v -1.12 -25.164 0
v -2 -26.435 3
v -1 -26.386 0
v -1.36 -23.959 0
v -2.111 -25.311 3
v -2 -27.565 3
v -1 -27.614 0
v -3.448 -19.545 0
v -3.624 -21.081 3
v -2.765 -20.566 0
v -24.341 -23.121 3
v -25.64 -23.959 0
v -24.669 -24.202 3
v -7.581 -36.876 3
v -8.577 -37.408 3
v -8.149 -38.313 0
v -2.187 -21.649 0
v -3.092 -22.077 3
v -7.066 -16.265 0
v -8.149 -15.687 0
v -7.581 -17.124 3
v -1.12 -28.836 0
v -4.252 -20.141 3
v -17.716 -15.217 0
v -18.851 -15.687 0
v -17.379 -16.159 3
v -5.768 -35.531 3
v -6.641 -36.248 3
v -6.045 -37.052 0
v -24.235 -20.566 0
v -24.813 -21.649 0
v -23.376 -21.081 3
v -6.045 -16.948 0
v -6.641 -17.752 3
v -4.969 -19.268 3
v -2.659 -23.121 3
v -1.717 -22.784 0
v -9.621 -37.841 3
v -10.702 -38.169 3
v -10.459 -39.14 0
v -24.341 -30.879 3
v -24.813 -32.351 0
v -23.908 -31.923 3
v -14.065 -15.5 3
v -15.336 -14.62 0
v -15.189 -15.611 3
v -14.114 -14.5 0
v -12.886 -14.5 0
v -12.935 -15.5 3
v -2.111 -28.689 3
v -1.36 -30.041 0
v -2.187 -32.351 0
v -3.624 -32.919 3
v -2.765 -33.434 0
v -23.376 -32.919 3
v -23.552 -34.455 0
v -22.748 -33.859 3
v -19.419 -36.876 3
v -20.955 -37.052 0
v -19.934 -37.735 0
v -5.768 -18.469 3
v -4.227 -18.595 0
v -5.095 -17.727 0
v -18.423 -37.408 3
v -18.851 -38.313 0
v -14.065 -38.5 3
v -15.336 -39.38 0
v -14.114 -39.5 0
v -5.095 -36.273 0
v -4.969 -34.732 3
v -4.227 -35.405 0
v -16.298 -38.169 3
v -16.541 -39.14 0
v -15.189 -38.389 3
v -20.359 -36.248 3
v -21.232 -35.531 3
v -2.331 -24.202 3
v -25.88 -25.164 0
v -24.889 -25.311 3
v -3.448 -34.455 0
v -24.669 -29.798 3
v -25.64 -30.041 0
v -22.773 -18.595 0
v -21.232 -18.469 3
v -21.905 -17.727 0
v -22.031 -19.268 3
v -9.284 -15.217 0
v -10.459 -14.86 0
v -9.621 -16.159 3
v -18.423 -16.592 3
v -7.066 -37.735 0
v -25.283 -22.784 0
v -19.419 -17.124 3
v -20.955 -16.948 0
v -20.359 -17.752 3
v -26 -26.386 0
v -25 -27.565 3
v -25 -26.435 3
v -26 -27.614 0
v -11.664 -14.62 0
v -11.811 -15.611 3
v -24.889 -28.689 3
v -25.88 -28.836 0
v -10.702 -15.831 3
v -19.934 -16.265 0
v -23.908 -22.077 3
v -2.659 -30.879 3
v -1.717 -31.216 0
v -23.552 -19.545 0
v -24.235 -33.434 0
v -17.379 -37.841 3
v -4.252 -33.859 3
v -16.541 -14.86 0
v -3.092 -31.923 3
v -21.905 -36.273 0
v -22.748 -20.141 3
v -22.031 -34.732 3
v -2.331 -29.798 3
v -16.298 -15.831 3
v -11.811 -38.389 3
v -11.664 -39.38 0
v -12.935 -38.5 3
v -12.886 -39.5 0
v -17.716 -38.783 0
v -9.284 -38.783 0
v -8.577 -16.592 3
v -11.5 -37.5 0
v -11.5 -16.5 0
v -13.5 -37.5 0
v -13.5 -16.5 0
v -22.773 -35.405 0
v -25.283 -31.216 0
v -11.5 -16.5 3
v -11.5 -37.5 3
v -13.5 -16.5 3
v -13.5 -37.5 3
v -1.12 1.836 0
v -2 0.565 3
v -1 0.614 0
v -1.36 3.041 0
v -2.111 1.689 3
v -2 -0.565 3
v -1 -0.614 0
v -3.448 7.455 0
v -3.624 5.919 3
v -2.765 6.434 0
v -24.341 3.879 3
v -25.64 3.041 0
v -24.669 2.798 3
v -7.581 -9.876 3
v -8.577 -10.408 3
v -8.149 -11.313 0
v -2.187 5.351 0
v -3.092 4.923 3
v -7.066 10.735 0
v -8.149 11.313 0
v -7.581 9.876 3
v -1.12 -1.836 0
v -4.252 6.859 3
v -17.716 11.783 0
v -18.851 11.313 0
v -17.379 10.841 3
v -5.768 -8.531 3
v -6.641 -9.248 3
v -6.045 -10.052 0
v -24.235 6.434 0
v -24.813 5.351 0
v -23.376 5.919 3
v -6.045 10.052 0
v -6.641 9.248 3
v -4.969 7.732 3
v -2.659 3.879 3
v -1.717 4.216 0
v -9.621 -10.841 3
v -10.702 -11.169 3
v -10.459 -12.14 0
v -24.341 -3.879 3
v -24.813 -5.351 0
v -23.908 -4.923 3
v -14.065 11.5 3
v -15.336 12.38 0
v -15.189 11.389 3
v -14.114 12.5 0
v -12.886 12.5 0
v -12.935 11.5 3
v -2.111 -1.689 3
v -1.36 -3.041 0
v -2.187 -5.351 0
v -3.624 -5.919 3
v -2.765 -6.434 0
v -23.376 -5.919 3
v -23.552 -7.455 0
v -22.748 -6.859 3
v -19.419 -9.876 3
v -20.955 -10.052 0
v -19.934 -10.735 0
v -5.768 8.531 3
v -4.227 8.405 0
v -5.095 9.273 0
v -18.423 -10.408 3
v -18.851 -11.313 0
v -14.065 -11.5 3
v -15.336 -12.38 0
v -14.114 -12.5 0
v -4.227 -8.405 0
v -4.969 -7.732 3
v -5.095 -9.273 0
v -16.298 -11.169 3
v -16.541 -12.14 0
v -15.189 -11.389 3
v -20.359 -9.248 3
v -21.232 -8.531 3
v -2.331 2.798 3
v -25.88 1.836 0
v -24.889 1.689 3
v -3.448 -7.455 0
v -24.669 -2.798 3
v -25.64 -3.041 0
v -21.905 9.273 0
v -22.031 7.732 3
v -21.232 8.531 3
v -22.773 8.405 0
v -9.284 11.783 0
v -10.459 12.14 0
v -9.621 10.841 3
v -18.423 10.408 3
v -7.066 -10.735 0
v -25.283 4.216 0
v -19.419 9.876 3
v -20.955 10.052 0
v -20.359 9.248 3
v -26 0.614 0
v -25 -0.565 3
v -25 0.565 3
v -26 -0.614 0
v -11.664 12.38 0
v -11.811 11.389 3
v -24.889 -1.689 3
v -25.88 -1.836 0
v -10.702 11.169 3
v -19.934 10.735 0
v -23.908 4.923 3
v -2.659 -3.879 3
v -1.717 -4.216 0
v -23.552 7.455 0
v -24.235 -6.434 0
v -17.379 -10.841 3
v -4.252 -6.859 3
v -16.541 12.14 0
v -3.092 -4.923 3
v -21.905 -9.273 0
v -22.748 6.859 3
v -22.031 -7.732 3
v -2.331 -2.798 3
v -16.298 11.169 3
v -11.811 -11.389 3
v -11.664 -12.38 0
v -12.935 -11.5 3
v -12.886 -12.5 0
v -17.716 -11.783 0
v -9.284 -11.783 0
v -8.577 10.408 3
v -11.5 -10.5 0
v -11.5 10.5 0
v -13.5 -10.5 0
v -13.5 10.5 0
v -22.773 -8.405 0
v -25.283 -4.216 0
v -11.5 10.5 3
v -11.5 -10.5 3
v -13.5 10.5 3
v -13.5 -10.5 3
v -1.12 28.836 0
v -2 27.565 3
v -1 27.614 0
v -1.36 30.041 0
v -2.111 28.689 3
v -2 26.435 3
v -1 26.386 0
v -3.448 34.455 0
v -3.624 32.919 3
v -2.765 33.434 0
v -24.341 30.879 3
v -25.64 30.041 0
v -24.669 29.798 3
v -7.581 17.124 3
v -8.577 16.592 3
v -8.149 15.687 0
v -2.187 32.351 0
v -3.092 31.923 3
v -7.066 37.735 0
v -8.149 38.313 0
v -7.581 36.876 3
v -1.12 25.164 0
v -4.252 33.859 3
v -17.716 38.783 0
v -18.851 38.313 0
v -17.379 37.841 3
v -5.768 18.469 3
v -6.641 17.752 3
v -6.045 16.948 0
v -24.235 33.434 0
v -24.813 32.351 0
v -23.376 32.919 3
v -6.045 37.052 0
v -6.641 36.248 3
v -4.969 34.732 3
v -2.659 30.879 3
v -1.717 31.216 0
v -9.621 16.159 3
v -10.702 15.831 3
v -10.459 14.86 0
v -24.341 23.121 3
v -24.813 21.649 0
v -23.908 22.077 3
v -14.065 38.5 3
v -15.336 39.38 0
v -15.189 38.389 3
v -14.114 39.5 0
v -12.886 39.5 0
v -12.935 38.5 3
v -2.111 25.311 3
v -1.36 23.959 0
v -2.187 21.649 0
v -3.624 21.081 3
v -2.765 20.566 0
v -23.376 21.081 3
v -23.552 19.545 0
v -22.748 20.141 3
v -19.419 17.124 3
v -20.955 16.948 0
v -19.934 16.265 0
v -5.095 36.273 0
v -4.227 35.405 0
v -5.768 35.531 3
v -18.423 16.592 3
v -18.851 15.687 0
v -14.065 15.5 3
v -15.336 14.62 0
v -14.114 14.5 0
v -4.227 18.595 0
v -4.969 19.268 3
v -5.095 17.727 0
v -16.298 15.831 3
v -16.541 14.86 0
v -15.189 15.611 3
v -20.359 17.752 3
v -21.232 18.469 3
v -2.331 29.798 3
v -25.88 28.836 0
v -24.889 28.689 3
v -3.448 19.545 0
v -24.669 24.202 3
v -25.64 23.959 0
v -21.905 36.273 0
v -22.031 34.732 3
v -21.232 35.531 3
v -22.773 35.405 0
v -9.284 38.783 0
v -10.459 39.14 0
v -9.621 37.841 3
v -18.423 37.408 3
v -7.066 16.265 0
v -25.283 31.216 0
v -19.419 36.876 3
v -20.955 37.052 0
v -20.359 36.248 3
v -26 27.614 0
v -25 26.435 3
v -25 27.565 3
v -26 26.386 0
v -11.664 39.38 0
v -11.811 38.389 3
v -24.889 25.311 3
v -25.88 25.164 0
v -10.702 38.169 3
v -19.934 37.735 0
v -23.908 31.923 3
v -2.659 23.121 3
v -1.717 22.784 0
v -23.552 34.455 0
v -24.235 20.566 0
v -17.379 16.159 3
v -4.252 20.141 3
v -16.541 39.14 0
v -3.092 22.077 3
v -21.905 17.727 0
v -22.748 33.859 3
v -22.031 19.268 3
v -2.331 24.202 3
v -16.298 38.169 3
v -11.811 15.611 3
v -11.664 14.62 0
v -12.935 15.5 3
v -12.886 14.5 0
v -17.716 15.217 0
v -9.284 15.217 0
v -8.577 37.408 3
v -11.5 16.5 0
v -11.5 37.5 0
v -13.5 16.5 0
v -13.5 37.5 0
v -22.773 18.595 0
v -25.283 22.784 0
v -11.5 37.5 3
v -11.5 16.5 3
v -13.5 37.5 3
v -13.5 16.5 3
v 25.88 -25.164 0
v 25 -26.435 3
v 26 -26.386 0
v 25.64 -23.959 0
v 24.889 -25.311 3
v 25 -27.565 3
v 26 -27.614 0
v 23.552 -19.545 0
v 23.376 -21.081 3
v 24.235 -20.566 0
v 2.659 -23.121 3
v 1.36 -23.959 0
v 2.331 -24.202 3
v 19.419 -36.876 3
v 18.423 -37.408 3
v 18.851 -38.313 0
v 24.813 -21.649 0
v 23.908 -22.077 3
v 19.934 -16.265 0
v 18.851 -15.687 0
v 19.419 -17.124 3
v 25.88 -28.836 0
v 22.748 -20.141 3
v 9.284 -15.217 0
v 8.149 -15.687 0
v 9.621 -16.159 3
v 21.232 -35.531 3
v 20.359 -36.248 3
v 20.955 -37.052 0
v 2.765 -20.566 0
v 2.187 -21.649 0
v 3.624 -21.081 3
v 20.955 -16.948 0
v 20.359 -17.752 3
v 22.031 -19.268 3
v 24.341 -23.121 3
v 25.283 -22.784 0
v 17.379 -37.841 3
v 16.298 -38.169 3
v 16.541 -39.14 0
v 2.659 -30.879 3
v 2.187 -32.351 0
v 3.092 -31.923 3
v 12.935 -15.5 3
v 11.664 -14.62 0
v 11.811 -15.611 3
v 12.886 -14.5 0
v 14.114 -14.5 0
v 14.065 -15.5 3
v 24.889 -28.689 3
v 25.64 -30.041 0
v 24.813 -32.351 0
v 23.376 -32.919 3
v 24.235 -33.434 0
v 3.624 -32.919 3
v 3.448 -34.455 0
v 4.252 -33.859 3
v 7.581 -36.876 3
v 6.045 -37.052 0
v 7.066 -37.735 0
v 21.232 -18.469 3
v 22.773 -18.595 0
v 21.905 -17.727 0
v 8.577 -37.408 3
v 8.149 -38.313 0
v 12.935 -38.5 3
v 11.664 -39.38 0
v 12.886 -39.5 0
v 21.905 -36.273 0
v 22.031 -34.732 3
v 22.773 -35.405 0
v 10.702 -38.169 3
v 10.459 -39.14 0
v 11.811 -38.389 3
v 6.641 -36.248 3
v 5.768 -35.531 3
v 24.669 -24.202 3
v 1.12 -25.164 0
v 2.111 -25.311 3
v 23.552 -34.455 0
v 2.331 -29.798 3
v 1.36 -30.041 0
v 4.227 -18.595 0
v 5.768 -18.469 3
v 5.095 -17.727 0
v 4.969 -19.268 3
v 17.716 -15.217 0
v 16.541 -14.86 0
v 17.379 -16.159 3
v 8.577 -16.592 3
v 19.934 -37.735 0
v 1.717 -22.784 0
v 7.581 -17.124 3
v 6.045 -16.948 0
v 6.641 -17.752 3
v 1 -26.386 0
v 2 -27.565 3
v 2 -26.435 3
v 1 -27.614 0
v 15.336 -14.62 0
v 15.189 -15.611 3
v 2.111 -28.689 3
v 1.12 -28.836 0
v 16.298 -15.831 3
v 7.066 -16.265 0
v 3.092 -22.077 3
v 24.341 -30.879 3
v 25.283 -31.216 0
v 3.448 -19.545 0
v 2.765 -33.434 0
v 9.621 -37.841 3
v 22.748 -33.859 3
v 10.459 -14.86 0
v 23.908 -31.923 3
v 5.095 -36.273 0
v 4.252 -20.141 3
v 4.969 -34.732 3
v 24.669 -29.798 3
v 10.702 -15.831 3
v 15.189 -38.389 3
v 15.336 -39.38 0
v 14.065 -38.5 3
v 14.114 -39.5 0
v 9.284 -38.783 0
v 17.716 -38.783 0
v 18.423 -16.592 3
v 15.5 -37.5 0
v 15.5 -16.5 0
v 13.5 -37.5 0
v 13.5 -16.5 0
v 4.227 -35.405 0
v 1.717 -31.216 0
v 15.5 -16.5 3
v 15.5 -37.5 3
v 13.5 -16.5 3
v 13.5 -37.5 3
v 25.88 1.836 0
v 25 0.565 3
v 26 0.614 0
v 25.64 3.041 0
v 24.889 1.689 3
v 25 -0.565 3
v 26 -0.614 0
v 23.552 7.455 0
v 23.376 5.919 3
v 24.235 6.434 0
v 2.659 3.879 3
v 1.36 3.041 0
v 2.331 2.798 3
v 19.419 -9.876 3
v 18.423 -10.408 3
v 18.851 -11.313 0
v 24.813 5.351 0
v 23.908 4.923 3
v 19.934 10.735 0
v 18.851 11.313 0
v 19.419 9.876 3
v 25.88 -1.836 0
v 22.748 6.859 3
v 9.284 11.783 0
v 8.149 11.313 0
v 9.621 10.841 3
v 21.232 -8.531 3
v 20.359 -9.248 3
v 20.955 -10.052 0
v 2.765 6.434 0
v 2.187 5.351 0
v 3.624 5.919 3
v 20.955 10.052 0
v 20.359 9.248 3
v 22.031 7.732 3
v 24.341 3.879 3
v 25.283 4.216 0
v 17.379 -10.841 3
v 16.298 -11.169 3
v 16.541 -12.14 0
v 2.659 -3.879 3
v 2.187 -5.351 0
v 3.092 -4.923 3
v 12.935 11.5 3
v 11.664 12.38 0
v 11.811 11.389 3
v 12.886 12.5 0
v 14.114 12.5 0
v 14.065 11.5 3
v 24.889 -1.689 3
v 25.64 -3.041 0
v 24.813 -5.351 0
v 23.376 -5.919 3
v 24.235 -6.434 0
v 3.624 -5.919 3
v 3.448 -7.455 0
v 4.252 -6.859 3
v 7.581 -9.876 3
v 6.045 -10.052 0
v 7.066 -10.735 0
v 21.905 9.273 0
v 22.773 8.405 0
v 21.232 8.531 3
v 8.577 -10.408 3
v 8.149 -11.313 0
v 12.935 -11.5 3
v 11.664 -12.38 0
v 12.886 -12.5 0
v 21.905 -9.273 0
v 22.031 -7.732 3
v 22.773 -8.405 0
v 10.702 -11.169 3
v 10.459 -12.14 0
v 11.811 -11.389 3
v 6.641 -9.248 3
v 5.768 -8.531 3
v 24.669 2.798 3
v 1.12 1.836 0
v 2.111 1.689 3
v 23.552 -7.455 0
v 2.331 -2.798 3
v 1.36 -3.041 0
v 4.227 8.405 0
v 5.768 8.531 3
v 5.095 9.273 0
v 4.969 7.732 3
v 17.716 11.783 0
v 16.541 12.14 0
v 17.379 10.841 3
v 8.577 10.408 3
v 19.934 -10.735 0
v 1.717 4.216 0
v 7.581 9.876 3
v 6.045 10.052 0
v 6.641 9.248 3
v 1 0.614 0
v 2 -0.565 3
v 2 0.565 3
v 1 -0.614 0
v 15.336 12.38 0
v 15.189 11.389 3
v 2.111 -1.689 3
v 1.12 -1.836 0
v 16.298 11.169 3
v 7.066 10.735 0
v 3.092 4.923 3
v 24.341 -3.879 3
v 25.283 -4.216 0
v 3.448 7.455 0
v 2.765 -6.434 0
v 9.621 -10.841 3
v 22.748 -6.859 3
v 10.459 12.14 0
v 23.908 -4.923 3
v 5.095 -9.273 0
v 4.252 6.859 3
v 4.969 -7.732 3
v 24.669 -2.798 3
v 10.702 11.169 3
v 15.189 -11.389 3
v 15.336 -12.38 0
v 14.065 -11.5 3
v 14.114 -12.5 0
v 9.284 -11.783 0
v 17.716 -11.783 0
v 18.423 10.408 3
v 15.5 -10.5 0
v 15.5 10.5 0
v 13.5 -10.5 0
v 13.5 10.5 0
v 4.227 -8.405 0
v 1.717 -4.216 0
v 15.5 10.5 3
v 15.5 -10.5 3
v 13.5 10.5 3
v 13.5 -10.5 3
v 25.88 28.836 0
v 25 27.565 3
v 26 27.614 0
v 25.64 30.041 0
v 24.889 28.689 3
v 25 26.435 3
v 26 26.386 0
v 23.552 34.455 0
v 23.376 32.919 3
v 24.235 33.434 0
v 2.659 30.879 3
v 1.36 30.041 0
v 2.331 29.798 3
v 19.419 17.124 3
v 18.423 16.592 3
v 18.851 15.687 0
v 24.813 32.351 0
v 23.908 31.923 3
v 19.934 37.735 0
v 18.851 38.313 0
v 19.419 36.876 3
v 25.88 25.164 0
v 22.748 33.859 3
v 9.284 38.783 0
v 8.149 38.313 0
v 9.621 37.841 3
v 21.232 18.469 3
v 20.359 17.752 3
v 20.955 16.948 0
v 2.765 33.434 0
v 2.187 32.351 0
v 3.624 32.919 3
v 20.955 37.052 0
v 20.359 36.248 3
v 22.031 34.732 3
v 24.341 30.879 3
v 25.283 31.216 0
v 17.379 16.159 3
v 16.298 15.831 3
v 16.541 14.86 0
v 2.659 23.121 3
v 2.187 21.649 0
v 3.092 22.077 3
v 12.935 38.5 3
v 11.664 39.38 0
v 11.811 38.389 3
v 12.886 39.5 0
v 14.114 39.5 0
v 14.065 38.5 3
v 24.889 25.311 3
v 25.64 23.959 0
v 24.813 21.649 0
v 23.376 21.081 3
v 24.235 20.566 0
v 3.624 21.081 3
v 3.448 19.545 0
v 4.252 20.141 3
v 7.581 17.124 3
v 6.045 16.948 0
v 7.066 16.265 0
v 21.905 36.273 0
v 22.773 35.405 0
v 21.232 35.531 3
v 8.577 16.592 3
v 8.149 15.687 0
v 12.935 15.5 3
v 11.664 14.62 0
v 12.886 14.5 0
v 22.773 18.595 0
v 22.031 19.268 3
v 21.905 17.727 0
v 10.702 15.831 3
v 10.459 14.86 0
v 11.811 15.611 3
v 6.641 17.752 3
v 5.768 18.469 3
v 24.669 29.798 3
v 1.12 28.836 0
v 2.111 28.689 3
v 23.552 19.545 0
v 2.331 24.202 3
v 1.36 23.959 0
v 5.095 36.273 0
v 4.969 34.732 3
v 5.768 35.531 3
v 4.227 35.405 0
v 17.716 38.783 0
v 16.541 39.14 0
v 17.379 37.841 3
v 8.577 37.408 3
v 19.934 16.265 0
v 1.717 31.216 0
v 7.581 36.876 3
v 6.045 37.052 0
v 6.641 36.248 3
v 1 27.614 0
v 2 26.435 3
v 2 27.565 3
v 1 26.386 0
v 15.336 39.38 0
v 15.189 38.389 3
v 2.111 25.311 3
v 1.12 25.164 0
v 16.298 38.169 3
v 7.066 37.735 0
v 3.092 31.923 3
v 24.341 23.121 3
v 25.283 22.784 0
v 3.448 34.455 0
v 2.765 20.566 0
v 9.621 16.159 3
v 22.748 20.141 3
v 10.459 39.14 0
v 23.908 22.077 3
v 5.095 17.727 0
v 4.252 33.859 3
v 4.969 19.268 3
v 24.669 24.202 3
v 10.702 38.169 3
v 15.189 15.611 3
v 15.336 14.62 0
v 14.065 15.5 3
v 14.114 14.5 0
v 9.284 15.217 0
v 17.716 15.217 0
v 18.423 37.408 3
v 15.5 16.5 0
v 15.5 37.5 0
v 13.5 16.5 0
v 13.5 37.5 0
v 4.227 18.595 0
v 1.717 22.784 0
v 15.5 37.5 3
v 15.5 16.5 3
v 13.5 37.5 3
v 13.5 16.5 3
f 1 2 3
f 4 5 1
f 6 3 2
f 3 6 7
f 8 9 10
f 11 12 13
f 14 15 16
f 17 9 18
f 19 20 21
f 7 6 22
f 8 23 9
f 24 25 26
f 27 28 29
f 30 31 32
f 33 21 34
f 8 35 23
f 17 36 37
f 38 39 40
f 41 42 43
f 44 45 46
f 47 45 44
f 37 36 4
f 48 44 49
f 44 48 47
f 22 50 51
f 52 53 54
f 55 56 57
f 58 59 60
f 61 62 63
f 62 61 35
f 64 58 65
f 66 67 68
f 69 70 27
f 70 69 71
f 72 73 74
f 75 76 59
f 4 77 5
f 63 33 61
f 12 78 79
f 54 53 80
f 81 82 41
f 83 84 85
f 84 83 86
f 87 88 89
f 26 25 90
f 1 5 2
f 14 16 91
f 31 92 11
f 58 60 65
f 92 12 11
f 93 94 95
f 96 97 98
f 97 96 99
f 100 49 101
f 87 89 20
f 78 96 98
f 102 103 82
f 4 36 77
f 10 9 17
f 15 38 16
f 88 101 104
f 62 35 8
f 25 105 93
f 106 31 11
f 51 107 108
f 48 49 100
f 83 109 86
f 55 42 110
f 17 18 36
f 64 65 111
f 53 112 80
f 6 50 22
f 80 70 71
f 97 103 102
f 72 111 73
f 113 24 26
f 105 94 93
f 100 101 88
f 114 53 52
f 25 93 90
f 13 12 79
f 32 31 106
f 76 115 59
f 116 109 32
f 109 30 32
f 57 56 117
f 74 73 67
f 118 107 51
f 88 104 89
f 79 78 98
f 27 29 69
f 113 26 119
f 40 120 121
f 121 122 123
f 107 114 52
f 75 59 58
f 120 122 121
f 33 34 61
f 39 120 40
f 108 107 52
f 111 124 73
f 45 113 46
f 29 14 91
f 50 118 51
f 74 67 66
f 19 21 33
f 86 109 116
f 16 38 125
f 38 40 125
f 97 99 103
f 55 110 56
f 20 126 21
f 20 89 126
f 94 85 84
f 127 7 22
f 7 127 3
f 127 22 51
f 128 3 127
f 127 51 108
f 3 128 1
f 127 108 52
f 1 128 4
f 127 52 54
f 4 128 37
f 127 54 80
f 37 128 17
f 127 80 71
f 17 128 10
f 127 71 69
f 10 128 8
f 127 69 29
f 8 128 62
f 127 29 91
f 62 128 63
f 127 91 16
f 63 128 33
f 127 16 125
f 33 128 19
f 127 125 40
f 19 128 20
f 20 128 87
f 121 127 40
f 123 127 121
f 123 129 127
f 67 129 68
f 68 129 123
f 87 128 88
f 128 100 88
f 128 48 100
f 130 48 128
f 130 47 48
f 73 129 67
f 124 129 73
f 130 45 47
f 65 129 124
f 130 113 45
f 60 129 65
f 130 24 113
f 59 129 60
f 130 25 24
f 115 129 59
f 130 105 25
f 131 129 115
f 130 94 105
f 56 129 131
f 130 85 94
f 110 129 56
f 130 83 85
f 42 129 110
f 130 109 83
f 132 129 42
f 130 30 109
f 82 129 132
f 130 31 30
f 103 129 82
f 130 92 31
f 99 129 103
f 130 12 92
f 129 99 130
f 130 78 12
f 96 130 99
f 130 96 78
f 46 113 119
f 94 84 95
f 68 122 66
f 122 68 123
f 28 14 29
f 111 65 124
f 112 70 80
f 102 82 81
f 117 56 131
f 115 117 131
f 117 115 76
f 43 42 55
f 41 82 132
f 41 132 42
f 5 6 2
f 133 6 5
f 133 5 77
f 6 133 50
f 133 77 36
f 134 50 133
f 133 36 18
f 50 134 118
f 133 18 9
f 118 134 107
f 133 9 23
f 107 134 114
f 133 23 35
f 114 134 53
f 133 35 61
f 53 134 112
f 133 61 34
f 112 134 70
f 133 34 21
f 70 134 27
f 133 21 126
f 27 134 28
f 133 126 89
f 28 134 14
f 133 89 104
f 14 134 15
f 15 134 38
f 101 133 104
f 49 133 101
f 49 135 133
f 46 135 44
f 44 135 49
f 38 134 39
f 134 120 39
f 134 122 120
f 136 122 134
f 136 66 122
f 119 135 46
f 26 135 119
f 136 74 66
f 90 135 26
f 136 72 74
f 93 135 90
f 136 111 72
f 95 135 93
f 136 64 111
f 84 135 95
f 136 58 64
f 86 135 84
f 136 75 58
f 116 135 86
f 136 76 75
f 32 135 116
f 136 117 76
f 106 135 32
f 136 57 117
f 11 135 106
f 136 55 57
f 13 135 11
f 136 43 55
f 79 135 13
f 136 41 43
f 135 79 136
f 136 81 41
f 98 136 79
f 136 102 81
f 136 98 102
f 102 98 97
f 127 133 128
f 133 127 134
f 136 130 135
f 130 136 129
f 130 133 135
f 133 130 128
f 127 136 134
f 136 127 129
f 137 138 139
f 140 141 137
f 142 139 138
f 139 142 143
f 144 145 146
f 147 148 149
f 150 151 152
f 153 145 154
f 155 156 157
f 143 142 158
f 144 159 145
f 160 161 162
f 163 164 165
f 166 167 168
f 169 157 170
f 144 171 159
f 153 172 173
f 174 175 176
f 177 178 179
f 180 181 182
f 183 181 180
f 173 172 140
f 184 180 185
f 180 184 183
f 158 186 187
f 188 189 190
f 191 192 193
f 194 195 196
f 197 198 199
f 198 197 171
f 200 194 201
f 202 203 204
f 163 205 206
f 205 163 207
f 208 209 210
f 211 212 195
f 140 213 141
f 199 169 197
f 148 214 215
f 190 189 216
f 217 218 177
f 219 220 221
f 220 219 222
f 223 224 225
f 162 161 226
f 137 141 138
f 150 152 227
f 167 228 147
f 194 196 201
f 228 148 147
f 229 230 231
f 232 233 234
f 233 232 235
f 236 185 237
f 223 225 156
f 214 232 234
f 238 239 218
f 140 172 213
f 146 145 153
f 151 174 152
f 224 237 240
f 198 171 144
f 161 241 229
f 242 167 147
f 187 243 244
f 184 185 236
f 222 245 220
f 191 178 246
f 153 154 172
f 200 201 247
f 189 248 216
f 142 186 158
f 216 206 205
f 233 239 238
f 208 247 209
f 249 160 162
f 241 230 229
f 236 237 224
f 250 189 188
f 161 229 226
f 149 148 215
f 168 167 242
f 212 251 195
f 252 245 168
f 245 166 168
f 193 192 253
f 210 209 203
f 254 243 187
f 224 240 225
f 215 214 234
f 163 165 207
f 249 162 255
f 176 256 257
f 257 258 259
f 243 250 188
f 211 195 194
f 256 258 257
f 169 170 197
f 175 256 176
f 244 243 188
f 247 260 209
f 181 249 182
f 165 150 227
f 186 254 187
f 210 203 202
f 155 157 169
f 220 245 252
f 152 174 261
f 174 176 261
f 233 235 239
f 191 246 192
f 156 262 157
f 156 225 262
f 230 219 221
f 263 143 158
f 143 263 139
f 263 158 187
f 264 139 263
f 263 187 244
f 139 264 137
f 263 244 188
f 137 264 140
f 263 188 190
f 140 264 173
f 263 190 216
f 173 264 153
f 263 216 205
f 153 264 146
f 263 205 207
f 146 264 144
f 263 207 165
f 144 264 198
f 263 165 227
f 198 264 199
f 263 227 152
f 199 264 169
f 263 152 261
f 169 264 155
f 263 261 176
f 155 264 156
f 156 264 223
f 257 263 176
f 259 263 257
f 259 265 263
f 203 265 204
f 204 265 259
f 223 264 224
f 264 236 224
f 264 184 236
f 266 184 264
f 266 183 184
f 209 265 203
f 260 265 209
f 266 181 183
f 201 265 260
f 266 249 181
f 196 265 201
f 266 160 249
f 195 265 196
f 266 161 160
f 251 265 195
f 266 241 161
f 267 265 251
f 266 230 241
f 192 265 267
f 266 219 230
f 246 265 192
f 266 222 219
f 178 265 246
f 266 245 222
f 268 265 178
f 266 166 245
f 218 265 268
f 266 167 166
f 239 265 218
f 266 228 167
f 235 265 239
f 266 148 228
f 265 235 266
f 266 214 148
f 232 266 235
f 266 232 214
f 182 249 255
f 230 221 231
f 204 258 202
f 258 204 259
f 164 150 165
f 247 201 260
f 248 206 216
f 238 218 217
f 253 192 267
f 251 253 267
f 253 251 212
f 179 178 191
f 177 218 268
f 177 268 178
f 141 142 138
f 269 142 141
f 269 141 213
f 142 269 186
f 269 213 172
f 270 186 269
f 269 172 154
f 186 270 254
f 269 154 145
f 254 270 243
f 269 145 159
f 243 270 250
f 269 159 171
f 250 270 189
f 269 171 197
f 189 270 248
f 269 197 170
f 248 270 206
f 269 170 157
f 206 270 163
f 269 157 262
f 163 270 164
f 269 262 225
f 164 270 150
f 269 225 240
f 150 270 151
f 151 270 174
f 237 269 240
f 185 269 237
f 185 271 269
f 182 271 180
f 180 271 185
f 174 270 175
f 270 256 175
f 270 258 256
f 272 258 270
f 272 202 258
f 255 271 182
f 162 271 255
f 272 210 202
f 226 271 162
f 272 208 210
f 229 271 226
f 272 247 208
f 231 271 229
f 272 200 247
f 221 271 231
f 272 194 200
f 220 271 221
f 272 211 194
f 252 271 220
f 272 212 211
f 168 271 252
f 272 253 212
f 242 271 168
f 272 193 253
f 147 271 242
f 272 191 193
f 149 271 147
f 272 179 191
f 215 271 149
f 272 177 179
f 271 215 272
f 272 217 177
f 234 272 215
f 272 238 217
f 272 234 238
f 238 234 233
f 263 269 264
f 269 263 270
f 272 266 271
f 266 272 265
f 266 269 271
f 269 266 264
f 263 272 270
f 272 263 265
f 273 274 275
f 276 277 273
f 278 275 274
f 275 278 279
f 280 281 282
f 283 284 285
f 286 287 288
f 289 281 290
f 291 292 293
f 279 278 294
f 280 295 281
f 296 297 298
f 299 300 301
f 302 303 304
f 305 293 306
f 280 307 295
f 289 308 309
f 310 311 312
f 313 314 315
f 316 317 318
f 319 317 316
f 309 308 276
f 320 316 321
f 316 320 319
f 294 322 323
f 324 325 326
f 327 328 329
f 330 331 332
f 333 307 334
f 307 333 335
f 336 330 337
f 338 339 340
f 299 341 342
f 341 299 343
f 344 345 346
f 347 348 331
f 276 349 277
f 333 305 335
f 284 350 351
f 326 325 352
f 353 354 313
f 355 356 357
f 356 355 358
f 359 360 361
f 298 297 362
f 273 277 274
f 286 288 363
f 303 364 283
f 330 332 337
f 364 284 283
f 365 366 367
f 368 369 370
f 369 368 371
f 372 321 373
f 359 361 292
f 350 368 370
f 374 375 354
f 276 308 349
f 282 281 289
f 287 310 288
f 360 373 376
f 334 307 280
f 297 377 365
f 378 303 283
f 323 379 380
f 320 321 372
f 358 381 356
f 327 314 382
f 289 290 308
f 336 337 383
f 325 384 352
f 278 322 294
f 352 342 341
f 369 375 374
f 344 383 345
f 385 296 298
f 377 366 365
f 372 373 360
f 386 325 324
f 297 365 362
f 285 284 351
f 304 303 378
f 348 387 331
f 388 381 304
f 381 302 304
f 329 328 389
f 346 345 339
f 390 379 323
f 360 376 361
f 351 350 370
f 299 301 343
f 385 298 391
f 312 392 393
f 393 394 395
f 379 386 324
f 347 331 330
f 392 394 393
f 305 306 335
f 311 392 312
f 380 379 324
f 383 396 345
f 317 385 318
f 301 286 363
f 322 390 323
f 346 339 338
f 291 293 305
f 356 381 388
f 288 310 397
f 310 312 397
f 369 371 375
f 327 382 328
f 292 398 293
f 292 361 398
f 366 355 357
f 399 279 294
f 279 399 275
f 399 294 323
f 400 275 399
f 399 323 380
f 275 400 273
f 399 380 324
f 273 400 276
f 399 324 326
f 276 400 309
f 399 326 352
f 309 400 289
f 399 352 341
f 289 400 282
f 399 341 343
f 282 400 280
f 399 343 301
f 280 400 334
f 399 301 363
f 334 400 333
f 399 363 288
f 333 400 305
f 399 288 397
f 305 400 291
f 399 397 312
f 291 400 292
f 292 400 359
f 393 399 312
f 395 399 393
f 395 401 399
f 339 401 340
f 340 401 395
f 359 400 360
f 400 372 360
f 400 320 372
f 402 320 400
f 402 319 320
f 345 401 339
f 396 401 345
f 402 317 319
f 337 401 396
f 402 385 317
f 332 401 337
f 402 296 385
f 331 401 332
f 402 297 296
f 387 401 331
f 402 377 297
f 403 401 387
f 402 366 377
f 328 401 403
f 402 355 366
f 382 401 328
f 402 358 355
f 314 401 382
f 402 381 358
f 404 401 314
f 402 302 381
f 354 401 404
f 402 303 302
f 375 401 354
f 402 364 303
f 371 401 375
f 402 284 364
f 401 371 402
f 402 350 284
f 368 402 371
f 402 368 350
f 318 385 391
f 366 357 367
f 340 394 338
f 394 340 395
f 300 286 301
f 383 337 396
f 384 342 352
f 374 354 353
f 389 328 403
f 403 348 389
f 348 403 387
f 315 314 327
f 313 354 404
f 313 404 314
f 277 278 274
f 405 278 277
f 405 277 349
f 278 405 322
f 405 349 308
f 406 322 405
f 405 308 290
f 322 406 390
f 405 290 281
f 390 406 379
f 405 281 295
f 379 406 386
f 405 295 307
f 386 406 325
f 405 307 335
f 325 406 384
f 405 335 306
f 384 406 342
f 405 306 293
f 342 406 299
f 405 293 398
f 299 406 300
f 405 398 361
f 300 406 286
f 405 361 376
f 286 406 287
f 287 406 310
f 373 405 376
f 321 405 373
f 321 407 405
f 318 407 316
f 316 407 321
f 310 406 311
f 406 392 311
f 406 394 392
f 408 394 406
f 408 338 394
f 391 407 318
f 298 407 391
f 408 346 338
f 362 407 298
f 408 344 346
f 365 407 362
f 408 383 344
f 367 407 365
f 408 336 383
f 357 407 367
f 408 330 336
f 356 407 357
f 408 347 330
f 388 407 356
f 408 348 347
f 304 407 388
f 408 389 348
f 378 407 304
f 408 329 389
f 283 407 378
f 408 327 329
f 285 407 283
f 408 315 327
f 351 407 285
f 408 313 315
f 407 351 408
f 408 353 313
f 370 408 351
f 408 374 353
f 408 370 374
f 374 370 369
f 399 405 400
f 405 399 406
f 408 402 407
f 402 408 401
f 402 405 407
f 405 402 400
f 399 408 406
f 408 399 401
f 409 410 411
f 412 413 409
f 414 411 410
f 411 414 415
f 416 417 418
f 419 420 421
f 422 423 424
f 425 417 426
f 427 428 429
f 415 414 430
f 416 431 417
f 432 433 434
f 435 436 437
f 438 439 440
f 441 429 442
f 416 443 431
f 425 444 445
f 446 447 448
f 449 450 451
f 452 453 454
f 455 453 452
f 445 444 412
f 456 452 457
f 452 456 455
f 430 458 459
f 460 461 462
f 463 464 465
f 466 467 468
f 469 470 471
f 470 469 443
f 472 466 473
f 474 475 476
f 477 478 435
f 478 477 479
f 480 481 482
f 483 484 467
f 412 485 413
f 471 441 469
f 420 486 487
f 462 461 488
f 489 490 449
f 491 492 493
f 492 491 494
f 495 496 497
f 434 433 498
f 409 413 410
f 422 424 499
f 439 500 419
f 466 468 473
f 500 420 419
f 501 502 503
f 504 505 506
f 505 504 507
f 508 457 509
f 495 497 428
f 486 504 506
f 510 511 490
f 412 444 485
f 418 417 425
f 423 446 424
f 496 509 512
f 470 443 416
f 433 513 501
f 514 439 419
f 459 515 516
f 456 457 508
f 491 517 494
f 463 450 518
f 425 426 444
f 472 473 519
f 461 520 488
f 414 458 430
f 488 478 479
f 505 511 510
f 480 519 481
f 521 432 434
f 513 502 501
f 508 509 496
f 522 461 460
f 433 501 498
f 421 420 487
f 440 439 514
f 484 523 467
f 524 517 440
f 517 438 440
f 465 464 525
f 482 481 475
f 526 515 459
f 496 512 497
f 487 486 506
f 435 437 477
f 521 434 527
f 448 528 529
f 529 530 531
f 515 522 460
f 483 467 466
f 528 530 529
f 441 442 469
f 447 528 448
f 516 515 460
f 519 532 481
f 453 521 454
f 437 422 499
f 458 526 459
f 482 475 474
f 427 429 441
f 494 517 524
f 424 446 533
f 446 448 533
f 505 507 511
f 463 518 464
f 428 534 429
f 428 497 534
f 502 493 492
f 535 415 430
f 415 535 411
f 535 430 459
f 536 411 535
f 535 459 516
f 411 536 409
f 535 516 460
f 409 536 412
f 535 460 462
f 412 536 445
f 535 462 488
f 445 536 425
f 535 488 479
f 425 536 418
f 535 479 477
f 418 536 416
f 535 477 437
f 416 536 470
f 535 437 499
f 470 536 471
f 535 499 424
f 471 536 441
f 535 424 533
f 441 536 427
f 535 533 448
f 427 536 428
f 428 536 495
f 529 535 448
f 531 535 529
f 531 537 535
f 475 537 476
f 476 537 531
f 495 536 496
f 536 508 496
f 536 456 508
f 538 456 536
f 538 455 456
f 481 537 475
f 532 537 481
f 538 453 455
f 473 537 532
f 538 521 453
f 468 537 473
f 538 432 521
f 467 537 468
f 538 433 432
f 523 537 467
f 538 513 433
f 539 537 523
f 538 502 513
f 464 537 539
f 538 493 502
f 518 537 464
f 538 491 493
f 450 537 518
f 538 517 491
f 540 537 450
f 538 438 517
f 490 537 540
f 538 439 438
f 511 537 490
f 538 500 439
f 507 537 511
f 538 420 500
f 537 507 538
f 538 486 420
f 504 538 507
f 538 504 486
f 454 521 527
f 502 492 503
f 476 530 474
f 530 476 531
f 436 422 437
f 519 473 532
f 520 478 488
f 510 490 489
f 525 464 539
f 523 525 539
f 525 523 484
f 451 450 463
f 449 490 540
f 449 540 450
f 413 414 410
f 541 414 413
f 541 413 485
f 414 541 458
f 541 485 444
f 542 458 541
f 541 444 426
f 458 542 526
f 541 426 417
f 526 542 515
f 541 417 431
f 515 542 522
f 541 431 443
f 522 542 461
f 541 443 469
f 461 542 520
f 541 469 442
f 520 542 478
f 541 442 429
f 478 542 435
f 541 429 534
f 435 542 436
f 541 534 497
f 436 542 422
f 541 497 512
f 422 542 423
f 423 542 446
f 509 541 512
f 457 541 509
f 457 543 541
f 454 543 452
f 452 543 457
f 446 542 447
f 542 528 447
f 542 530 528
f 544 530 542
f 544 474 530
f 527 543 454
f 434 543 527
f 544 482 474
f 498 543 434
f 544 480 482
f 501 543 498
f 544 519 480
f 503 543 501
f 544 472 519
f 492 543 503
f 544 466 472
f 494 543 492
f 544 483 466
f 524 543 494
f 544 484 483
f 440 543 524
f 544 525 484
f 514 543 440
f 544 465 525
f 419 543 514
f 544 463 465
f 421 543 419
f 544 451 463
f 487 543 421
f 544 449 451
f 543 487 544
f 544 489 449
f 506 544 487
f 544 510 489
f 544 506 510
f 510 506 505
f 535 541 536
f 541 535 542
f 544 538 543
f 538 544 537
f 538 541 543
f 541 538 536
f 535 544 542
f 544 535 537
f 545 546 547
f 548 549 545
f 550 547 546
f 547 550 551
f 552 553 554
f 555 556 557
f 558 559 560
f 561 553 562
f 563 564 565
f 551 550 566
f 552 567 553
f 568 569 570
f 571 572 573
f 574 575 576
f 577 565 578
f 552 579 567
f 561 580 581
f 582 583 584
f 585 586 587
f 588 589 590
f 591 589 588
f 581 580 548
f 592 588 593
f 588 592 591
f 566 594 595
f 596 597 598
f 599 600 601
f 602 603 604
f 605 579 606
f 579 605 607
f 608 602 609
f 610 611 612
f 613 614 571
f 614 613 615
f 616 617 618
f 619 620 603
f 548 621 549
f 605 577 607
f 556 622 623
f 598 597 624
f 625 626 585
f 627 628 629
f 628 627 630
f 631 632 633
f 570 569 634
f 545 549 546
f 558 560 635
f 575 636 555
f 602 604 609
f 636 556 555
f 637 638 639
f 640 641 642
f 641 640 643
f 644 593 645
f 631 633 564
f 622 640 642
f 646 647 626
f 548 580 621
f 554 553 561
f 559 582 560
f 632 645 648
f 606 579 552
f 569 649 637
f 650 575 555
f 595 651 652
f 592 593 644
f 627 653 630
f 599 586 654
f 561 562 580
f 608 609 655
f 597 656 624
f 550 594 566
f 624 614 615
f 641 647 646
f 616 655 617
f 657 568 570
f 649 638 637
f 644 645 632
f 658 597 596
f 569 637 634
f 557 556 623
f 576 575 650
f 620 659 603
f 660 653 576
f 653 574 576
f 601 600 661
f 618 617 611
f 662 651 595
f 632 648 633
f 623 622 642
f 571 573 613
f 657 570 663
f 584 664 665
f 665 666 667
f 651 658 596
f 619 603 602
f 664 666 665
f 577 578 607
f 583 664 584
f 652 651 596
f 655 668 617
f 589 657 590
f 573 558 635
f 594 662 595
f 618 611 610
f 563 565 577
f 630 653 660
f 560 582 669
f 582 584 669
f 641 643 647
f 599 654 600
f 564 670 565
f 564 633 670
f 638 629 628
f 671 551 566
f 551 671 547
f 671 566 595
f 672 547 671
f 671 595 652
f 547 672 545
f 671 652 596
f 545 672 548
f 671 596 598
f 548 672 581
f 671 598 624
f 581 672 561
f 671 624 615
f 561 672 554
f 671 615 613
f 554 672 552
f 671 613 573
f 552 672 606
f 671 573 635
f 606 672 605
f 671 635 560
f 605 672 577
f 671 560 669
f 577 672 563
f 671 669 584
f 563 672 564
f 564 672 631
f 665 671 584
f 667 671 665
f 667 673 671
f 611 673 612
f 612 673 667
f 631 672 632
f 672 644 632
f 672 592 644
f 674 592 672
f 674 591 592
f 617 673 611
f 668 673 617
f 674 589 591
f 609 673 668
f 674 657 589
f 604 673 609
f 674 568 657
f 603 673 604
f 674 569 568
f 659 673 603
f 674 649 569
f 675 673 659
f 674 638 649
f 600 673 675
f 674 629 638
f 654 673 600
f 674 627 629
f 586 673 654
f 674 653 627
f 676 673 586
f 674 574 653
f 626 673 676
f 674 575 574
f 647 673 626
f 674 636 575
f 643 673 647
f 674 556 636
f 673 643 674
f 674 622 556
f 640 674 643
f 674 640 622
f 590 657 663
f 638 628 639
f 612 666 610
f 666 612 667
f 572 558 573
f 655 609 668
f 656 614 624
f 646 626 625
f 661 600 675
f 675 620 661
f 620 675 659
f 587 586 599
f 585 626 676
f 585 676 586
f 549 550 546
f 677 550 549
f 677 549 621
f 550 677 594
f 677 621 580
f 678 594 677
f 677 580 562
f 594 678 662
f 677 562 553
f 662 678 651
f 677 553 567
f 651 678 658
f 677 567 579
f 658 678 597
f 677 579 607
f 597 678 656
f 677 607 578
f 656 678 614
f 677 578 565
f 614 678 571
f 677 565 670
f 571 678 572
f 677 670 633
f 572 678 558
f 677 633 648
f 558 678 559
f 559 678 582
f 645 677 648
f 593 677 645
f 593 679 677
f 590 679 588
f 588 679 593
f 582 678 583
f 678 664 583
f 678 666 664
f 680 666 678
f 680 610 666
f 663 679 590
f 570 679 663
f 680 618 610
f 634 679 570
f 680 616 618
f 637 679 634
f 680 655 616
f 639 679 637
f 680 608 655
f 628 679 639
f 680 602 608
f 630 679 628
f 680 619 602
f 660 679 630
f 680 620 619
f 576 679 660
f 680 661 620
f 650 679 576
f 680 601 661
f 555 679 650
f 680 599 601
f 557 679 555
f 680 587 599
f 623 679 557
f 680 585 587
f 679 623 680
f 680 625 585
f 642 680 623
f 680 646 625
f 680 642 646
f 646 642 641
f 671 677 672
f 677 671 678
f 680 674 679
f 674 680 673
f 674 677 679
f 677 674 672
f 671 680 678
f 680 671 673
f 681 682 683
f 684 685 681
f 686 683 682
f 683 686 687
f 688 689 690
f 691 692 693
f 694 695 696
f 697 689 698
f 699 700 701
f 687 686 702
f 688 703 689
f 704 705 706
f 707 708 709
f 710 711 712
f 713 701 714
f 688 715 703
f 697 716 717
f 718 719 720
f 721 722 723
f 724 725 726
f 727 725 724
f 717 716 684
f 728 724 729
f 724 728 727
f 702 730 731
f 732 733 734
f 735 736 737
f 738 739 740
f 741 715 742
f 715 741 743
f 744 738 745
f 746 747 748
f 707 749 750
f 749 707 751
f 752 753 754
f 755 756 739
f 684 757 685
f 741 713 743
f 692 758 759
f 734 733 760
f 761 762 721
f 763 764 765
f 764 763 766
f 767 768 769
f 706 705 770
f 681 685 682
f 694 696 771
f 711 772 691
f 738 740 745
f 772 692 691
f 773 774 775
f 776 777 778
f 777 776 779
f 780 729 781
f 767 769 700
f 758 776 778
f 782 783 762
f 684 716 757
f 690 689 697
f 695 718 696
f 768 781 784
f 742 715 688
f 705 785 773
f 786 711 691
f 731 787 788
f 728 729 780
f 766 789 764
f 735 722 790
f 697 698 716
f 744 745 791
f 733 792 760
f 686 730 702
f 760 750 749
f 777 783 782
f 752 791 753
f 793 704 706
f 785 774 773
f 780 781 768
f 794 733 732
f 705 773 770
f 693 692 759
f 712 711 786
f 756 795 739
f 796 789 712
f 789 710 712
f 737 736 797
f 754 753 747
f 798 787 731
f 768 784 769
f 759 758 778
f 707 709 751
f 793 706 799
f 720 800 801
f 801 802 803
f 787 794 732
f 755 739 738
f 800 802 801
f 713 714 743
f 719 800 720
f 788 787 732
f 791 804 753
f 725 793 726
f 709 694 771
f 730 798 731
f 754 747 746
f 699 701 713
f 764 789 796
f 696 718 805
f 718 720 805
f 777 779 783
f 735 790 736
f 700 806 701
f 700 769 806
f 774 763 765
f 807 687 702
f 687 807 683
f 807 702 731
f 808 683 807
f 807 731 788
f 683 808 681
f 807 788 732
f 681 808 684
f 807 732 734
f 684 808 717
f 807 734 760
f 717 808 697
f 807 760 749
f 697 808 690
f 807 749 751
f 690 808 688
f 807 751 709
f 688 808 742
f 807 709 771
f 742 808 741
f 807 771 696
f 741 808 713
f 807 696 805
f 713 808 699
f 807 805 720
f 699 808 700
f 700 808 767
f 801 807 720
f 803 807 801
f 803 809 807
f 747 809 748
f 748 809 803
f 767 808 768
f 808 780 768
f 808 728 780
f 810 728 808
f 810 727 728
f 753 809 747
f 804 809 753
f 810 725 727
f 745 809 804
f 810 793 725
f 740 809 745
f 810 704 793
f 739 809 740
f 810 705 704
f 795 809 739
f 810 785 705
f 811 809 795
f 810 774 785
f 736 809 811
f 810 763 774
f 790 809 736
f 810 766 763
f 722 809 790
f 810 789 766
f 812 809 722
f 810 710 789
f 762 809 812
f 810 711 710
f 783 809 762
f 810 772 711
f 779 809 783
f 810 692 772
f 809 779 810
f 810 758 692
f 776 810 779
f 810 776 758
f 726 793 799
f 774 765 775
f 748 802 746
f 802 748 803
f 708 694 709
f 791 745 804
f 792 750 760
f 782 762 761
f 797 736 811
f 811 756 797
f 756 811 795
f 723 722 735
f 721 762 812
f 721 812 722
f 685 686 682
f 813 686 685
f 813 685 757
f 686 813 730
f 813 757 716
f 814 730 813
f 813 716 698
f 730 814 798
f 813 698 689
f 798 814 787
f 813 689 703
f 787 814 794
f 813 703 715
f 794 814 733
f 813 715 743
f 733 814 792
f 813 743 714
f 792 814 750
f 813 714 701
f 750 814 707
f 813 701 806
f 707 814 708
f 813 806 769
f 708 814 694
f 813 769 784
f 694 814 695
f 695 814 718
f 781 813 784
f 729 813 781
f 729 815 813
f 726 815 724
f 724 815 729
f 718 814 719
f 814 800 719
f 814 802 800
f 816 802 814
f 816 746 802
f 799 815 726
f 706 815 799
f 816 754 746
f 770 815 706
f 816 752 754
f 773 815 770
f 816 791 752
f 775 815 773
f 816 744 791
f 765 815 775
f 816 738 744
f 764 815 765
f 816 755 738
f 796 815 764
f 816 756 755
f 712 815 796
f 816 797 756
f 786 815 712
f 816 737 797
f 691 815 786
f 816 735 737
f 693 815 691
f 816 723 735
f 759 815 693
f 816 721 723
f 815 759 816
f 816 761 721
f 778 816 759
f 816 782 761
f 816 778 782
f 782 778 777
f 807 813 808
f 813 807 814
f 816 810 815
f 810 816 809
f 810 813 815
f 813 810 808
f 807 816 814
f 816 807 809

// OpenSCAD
// base v1_1
// GPLv2
// (c) 2012 TakeItAndRun
//
// v1_0: clean up code
// v1_1: make it work with customizer
// 
//

//*******************************************************
//
// basic definitions
//
//*******************************************************


// circle have $fn facets
$fn=+30;

// small displacement to avoid parallel faces with zero volume
e=+0.02;

// unit vectors
xaxis=[1,0,0];
yaxis=[0,1,0];
zaxis=[0,0,1];

//*******************************************************
//
// dimensions
//
//*******************************************************

/* [base] */
// form of base
rbfn=64;//[4:square,8:octagonal,64:round]
// diameter of the base (for square bases this is the width)
db=25;//[10:100]
// hexagonal and oktogonal a little less in width)
rb=db/2;
// width of the edge (in 1/10 units)
e=10;//[0:20]
edge=e/10;
// to calculate upper radius of the base
rb1=rb-edge;
// height of the base
hb=3;//[1:10]
/* [slit] */
// slit
slit=1;//[0:no slit,1:with slit]
// width of the slit
sx=2;//[1:10]
// offset of the slit off the center
dsx=1;//[0:10]
// length of the slit
sl=2*rb-2*edge-2;
/* [print] */
// distance between bases on the print bed
dxprint=2;//[1:10]
// number of bases in x-direction
nx=2;//[1:10]
// number of bases in y-direction
ny=3;//[1:10]

//*******************************************************
//
// routines
//
//*******************************************************

// base with n corners, set n=rbnf for a round base
module base(n,slit=1){
	difference(){
		rotate(180/n)cylinder(hb,rb/cos(180/n),rb1/cos(180/n),$fn=n);
		if(slit==1)mslit();
	}
}

// make a cubus for the slit to be cut from the base
module mslit(){
	translate(dsx*xaxis+(hb)/2*zaxis)cube([sx,sl,hb+2*e],true);
}

module printbase(n=4,slit=1,nx=5,ny=5){
	for(i=[-(nx-1)/2:(nx-1)/2])
	for(j=[-(ny-1)/2:(ny-1)/2])
		translate((dxprint+2*rb)*(i*xaxis+j*yaxis))base(n,slit);
}

// print a sampling of bases
module samplebase(){
	translate(0*(dxprint+2*rb)*yaxis)base(n=4,slit=1);
	translate(3*(dxprint+2*rb)*yaxis)rotate(30)base(n=6,slit=1);
	translate(2*(dxprint+2*rb)*yaxis)base(n=8,slit=1);
	translate(1*(dxprint+2*rb)*yaxis)base(n=rbfn,slit=1);
	translate(4*(dxprint+2*rb)*yaxis)difference(){
		rotate(30)base(n=6,slit=0);
		mslit();
	}
	
	translate(1*(dxprint+2*rb)*xaxis){
	translate(0*(dxprint+2*rb)*yaxis)base(n=4,slit=0);
	translate((3*(dxprint+2*rb)+rb)*yaxis)rotate(30)base(n=6,slit=0);
	translate(2*(dxprint+2*rb)*yaxis)base(n=8,slit=0);
	translate(1*(dxprint+2*rb)*yaxis)base(n=rbfn,slit=0);
	}
}


//*******************************************************
//
// main program
//
//*******************************************************

// one single base
// n=4 		makes it square, with r being half the diameter
// n=8 		oktogonal(sp?)
// n=rbfn 	round

//base(n=4,slit=0);

// print a sampling of bases
// color("lime")samplebase();

// print lots of bases all at once
//printbase(n=rbfn,slit=1);
printbase(n=rbfn,slit=slit,nx=nx,ny=ny);
